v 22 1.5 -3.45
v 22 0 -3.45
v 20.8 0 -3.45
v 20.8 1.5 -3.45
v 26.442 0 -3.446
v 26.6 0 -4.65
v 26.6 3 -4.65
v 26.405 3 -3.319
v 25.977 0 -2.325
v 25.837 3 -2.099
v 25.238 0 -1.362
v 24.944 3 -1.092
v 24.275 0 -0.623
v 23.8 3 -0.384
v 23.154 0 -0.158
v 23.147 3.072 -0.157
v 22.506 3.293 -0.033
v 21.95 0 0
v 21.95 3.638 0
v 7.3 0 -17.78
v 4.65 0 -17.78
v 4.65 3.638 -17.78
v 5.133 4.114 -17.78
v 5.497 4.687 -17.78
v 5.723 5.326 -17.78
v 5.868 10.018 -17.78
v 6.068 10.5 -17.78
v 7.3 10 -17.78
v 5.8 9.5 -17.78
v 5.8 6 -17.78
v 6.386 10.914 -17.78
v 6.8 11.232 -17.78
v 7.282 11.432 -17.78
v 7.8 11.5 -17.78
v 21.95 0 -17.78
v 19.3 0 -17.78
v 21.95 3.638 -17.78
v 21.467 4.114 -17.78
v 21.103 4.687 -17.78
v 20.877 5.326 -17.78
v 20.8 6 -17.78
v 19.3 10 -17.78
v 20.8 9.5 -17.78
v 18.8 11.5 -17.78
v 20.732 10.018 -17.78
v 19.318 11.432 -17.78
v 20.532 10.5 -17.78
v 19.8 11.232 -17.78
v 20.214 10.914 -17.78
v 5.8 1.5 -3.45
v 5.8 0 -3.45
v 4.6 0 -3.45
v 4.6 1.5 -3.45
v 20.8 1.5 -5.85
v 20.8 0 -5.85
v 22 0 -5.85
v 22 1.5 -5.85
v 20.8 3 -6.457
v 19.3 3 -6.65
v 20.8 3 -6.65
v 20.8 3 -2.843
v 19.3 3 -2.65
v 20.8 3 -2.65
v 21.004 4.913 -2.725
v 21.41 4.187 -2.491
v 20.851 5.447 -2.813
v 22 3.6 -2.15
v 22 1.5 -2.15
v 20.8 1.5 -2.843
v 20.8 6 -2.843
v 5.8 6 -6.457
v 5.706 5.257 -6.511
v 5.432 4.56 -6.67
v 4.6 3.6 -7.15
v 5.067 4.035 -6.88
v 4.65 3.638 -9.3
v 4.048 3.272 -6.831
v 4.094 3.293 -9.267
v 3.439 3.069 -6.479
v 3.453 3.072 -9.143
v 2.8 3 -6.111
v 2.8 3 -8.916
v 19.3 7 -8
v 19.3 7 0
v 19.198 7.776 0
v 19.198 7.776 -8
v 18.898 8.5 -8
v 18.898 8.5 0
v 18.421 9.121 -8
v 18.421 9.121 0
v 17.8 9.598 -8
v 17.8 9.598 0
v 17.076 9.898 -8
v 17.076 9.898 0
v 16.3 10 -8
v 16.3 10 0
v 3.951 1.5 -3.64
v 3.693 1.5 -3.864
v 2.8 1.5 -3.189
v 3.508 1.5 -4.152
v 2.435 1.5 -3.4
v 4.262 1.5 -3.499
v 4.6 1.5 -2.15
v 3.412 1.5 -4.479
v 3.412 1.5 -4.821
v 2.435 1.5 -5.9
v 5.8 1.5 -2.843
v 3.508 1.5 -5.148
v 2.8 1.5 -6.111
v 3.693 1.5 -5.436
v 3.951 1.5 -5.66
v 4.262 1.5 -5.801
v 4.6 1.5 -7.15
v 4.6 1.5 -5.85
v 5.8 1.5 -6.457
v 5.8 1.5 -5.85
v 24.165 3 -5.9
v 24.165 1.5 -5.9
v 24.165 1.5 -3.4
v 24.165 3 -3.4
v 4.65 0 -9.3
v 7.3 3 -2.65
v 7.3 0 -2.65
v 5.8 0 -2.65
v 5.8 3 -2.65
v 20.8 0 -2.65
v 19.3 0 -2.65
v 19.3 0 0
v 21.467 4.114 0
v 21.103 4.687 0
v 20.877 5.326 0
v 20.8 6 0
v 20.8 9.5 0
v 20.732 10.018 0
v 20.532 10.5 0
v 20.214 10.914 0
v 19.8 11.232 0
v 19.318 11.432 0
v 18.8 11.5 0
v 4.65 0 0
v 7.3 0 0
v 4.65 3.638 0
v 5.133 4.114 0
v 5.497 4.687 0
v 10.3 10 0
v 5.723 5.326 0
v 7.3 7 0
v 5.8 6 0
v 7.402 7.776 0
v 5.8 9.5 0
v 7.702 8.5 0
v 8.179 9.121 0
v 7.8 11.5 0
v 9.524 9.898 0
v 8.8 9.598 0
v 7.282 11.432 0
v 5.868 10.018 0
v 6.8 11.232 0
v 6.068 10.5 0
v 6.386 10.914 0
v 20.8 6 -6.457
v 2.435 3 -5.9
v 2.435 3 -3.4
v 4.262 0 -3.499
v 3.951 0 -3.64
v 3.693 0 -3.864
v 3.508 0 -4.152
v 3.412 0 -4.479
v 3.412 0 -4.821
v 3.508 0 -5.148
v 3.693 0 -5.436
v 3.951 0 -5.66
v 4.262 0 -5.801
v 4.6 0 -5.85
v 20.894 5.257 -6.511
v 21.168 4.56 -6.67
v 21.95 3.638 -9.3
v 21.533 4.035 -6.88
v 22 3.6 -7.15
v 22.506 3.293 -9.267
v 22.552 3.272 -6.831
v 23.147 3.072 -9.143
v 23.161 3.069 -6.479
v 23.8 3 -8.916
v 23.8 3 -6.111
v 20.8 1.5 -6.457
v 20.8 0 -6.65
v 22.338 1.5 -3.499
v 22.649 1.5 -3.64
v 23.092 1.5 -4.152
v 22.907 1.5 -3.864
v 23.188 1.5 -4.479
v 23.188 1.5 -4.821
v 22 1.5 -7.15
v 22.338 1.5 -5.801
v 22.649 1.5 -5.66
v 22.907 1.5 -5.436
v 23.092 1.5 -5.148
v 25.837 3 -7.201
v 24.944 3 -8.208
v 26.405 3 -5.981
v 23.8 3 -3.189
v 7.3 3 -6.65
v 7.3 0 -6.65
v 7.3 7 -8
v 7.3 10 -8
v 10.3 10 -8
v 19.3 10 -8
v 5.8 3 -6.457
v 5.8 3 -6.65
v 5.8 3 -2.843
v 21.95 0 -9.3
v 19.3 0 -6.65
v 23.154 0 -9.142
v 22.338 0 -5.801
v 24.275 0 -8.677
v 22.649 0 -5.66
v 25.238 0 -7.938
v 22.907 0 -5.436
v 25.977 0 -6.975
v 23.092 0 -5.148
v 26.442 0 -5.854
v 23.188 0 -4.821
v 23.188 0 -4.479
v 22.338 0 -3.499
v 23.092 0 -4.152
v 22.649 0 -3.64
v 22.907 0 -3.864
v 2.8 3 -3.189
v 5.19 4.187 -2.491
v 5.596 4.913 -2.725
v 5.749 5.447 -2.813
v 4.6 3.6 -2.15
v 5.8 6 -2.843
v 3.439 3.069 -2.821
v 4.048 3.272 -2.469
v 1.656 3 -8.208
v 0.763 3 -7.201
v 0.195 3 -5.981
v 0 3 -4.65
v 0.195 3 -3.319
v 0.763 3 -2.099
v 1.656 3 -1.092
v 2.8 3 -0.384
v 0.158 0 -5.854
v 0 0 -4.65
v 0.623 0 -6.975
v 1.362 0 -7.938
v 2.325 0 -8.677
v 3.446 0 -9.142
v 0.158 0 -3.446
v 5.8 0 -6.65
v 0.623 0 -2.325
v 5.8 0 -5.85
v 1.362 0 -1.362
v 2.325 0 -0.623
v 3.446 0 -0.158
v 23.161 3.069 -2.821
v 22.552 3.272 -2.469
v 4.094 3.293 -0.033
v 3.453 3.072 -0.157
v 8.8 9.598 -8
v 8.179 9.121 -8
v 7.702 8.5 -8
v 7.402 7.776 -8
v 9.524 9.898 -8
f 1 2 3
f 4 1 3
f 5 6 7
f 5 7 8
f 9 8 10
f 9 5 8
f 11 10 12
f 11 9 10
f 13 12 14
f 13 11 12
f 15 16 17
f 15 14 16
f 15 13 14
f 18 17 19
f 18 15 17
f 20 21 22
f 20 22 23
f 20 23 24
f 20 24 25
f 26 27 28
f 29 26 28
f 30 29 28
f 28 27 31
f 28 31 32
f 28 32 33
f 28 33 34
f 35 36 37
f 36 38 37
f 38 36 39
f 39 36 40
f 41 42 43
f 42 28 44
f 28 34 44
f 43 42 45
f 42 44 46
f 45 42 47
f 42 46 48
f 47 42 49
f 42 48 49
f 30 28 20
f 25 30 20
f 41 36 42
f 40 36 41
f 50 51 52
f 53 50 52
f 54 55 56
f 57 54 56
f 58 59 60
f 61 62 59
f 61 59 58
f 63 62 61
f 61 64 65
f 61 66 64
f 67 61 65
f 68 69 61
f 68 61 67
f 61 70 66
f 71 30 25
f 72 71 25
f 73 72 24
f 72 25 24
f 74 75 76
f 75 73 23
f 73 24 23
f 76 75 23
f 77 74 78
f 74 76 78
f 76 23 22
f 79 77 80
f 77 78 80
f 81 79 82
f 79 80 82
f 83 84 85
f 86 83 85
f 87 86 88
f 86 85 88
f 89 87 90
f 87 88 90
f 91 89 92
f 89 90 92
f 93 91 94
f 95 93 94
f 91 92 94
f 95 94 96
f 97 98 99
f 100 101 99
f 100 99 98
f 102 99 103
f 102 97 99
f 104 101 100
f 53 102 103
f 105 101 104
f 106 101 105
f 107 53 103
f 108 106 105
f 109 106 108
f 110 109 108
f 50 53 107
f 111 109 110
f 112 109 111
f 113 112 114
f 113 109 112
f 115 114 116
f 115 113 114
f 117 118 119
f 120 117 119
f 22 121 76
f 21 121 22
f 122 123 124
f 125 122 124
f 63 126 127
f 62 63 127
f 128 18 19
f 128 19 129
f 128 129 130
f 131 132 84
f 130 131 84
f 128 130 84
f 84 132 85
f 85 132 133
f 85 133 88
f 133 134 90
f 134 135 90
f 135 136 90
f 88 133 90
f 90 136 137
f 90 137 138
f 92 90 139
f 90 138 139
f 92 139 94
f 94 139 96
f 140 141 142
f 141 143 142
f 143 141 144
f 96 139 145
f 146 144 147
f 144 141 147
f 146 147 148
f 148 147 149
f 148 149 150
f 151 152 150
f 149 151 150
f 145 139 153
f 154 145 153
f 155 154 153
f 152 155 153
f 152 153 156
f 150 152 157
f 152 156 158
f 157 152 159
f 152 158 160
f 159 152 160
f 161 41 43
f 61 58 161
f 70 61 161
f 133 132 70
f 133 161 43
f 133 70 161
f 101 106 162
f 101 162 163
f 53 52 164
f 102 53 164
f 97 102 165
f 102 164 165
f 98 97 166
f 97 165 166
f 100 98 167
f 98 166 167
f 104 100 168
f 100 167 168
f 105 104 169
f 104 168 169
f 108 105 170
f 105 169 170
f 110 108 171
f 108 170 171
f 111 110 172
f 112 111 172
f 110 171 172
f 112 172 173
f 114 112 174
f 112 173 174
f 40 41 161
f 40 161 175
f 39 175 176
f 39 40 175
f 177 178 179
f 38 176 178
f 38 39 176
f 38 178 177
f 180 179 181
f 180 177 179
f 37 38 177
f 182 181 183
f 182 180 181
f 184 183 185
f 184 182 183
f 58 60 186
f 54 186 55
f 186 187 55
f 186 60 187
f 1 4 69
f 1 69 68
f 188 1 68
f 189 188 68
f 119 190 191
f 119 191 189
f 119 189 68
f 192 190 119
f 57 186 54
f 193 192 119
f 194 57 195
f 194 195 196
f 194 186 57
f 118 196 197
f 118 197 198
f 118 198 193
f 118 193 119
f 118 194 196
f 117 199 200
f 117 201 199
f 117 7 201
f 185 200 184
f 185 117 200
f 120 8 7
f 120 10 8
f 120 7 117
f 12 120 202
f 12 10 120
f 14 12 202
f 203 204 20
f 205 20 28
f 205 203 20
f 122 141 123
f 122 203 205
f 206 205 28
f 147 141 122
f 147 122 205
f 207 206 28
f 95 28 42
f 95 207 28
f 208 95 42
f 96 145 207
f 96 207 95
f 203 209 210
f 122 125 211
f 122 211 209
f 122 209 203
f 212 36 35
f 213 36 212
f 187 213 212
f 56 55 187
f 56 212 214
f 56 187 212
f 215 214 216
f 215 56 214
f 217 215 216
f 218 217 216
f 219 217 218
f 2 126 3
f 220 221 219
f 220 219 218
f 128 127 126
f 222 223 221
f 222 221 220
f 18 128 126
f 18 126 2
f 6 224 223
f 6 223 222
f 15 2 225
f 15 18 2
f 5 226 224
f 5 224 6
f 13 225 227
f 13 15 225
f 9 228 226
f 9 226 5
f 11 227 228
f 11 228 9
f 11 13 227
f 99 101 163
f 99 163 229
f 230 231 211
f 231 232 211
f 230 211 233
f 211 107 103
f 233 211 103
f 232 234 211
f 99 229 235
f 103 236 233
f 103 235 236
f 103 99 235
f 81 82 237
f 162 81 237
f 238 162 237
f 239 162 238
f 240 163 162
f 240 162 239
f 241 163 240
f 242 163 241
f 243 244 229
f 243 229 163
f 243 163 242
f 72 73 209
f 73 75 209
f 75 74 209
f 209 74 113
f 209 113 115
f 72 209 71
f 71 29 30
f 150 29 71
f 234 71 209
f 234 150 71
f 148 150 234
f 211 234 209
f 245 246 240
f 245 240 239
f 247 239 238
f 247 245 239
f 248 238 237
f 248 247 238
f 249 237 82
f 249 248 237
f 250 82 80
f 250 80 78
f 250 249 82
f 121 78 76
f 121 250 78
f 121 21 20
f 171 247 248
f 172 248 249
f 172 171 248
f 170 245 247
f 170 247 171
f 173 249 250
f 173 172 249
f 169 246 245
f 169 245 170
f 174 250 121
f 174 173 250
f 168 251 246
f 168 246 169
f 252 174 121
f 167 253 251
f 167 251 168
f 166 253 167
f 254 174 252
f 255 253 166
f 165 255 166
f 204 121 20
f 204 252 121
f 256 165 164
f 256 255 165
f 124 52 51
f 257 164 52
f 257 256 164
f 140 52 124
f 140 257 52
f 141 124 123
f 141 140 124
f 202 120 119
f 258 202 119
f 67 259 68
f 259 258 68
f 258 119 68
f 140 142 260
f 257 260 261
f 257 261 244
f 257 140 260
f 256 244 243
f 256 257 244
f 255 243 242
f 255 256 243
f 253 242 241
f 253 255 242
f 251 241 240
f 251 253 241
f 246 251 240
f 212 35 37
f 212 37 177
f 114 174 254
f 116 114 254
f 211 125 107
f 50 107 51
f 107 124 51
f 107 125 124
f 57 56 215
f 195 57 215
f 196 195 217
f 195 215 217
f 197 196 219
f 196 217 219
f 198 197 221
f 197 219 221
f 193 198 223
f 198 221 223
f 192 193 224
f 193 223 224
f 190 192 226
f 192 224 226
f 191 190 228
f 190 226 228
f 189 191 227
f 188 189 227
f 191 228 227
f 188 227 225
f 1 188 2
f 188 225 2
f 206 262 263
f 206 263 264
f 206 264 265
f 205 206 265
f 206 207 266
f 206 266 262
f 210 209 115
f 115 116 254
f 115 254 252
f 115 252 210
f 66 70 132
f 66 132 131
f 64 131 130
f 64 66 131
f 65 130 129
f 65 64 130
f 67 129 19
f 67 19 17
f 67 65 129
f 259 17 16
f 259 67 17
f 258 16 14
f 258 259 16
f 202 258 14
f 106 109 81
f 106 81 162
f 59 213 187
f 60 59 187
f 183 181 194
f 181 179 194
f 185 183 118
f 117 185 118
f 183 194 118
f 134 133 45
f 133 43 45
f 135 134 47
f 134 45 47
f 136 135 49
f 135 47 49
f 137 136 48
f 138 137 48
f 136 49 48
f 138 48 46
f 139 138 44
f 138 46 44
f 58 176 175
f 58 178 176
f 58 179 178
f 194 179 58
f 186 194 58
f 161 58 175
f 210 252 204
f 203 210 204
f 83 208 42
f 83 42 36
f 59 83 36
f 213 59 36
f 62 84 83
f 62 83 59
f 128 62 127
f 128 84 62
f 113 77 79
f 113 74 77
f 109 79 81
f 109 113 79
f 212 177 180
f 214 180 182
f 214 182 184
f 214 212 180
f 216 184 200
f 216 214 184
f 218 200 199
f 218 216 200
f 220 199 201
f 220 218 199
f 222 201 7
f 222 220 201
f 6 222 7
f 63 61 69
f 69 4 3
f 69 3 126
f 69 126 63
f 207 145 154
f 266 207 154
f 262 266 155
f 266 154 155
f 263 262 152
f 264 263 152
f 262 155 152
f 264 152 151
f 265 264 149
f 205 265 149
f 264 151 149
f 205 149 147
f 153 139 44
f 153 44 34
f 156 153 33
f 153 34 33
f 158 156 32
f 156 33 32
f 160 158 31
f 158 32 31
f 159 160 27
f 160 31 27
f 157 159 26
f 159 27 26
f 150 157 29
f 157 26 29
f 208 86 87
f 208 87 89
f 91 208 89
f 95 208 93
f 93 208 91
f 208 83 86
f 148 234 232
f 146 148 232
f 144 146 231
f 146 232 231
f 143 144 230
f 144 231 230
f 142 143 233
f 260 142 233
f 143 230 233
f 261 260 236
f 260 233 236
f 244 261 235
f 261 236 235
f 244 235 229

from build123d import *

# Parameters (mm, degrees)
BOSS_EXTRUDE1_DEPTH     = 17.78
FILLET1_R               = 2
FILLET2_R               = 3
CUT_EXTRUDE5_DEPTH      = 34.999094106
CUT_EXTRUDE6_DEPTH      = 3
CUT_EXTRUDE7_DEPTH      = 3
CUT_EXTRUDE7_DEPTH_BACK = 1.5
BOSS_EXTRUDE2_DEPTH     = 8


with BuildPart() as part:
    # Sketch1 → Boss-Extrude1 (new body)
    with BuildSketch(Plane.XY):
        Polygon((0, 3), (0, 0), (7.3, 0), (7.3, 10), (13.3, 10), (19.3, 10), (19.3, 0), (26.6, 0), (26.6, 3), (20.8, 3), (20.8, 11.5), (5.8, 11.5), (5.8, 3), align=None)
    extrude(amount=-BOSS_EXTRUDE1_DEPTH)

    # Fillet1
    fillet1_edges = [part.edges().sort_by_distance(p)[0] for p in [
        (5.8, 11.5, -8.89),
        (20.8, 11.5, -8.89),
    ]]
    fillet(fillet1_edges, radius=FILLET1_R)

    # Fillet2
    fillet2_edges = [part.edges().sort_by_distance(p)[0] for p in [
        (5.8, 3, -8.89),
        (20.8, 3, -8.89),
    ]]
    fillet(fillet2_edges, radius=FILLET2_R)

    # Sketch2 → Cut-Extrude5 (cut, through all)
    with BuildSketch(Plane(origin=(0, 0, 0), x_dir=(1, 0, 0), z_dir=(0, 1, 0))):
        with BuildLine():
            Line((0, 17.78), (0, 4.65))
            ThreePointArc((0, 4.65), (1.361953467, 7.938046533), (4.65, 9.3))
            Line((4.65, 9.3), (4.65, 17.78))
            Line((4.65, 17.78), (0, 17.78))
        make_face()
        with BuildLine():
            Line((0, 4.65), (0, 0))
            Line((0, 0), (4.65, 0))
            ThreePointArc((4.65, 0), (1.361953467, 1.361953467), (0, 4.65))
        make_face()
        with BuildLine():
            ThreePointArc((21.95, 9.3), (25.238046535, 7.93804653), (26.6, 4.649999993))
            Line((26.6, 4.649999993), (26.6, 17.78))
            Line((26.6, 17.78), (21.95, 17.78))
            Line((21.95, 17.78), (21.95, 9.3))
        make_face()
        with BuildLine():
            Line((21.95, 0), (26.6, 0))
            Line((26.6, 0), (26.6, 4.649999993))
            ThreePointArc((26.6, 4.649999993), (25.23804653, 1.361953465), (21.95, 0))
        make_face()
    extrude(amount=CUT_EXTRUDE5_DEPTH, mode=Mode.SUBTRACT)

    # Sketch3 → Cut-Extrude6 (cut)
    with BuildSketch(Plane.XZ):
        with BuildLine():
            Line((7.3, -6.649999971), (7.3, -2.649999971))
            Line((7.3, -2.649999971), (5.8, -2.649999971))
            Line((5.8, -2.649999971), (5.8, -3.449999971))
            Line((5.8, -3.449999971), (4.6, -3.449999971))
            ThreePointArc((4.6, -3.449999971), (3.4, -4.649999971), (4.6, -5.849999971))
            Line((4.6, -5.849999971), (5.8, -5.849999971))
            Line((5.8, -5.849999971), (5.8, -6.649999971))
            Line((5.8, -6.649999971), (7.3, -6.649999971))
        make_face()
        with BuildLine():
            Line((20.8, -5.849999971), (22, -5.849999971))
            ThreePointArc((22, -5.849999971), (23.2, -4.649999971), (22, -3.449999971))
            Line((22, -3.449999971), (20.8, -3.449999971))
            Line((20.8, -3.449999971), (20.8, -2.649999971))
            Line((20.8, -2.649999971), (19.3, -2.649999971))
            Line((19.3, -2.649999971), (19.3, -6.649999971))
            Line((19.3, -6.649999971), (20.8, -6.649999971))
            Line((20.8, -6.649999971), (20.8, -5.849999971))
        make_face()
    extrude(amount=-CUT_EXTRUDE6_DEPTH, mode=Mode.SUBTRACT)

    # Sketch4 → Cut-Extrude7 (cut, two sides: drawn at the far end of the back side and taken through both)
    with BuildSketch(Plane(origin=(0, 3, 0), x_dir=(1, 0, 0), z_dir=(0, 1, 0)).offset(-CUT_EXTRUDE7_DEPTH_BACK)):
        Polygon((2.8, 3.189230456), (2.8, 6.110769486), (2.434936491, 5.899999971), (2.434936491, 3.399999971), align=None)
        Polygon((4.6, 2.149999971), (4.6, 4.649999971), (4.6, 7.149999971), (2.8, 6.110769486), (2.8, 3.189230456), align=None)
        Polygon((5.8, 2.842820294), (4.6, 2.149999971), (4.6, 4.649999971), (4.6, 7.149999971), (5.8, 6.457179648), align=None)
        Polygon((22, 2.149999971), (22, 4.649999971), (22, 7.149999971), (20.8, 6.457179648), (20.8, 2.842820294), align=None)
        Polygon((24.165063509, 5.899999971), (24.165063509, 3.399999971), (22, 2.149999971), (22, 4.649999971), (22, 7.149999971), align=None)
    extrude(amount=CUT_EXTRUDE7_DEPTH + CUT_EXTRUDE7_DEPTH_BACK, mode=Mode.SUBTRACT)

    # Sketch5 → Boss-Extrude2 (add)
    with BuildSketch(Plane(origin=(0, 0, 0), x_dir=(-1, 0, 0), z_dir=(0, 0, -1))):
        with BuildLine():
            Line((-16.3, 10), (-19.3, 10))
            Line((-19.3, 10), (-19.3, 7))
            ThreePointArc((-19.3, 7), (-18.421320344, 9.121320344), (-16.3, 10))
        make_face()
        with BuildLine():
            Line((-7.3, 7), (-7.3, 10))
            Line((-7.3, 10), (-10.3, 10))
            ThreePointArc((-10.3, 10), (-8.178679656, 9.121320344), (-7.3, 7))
        make_face()
    extrude(amount=BOSS_EXTRUDE2_DEPTH)


solid = part.part
